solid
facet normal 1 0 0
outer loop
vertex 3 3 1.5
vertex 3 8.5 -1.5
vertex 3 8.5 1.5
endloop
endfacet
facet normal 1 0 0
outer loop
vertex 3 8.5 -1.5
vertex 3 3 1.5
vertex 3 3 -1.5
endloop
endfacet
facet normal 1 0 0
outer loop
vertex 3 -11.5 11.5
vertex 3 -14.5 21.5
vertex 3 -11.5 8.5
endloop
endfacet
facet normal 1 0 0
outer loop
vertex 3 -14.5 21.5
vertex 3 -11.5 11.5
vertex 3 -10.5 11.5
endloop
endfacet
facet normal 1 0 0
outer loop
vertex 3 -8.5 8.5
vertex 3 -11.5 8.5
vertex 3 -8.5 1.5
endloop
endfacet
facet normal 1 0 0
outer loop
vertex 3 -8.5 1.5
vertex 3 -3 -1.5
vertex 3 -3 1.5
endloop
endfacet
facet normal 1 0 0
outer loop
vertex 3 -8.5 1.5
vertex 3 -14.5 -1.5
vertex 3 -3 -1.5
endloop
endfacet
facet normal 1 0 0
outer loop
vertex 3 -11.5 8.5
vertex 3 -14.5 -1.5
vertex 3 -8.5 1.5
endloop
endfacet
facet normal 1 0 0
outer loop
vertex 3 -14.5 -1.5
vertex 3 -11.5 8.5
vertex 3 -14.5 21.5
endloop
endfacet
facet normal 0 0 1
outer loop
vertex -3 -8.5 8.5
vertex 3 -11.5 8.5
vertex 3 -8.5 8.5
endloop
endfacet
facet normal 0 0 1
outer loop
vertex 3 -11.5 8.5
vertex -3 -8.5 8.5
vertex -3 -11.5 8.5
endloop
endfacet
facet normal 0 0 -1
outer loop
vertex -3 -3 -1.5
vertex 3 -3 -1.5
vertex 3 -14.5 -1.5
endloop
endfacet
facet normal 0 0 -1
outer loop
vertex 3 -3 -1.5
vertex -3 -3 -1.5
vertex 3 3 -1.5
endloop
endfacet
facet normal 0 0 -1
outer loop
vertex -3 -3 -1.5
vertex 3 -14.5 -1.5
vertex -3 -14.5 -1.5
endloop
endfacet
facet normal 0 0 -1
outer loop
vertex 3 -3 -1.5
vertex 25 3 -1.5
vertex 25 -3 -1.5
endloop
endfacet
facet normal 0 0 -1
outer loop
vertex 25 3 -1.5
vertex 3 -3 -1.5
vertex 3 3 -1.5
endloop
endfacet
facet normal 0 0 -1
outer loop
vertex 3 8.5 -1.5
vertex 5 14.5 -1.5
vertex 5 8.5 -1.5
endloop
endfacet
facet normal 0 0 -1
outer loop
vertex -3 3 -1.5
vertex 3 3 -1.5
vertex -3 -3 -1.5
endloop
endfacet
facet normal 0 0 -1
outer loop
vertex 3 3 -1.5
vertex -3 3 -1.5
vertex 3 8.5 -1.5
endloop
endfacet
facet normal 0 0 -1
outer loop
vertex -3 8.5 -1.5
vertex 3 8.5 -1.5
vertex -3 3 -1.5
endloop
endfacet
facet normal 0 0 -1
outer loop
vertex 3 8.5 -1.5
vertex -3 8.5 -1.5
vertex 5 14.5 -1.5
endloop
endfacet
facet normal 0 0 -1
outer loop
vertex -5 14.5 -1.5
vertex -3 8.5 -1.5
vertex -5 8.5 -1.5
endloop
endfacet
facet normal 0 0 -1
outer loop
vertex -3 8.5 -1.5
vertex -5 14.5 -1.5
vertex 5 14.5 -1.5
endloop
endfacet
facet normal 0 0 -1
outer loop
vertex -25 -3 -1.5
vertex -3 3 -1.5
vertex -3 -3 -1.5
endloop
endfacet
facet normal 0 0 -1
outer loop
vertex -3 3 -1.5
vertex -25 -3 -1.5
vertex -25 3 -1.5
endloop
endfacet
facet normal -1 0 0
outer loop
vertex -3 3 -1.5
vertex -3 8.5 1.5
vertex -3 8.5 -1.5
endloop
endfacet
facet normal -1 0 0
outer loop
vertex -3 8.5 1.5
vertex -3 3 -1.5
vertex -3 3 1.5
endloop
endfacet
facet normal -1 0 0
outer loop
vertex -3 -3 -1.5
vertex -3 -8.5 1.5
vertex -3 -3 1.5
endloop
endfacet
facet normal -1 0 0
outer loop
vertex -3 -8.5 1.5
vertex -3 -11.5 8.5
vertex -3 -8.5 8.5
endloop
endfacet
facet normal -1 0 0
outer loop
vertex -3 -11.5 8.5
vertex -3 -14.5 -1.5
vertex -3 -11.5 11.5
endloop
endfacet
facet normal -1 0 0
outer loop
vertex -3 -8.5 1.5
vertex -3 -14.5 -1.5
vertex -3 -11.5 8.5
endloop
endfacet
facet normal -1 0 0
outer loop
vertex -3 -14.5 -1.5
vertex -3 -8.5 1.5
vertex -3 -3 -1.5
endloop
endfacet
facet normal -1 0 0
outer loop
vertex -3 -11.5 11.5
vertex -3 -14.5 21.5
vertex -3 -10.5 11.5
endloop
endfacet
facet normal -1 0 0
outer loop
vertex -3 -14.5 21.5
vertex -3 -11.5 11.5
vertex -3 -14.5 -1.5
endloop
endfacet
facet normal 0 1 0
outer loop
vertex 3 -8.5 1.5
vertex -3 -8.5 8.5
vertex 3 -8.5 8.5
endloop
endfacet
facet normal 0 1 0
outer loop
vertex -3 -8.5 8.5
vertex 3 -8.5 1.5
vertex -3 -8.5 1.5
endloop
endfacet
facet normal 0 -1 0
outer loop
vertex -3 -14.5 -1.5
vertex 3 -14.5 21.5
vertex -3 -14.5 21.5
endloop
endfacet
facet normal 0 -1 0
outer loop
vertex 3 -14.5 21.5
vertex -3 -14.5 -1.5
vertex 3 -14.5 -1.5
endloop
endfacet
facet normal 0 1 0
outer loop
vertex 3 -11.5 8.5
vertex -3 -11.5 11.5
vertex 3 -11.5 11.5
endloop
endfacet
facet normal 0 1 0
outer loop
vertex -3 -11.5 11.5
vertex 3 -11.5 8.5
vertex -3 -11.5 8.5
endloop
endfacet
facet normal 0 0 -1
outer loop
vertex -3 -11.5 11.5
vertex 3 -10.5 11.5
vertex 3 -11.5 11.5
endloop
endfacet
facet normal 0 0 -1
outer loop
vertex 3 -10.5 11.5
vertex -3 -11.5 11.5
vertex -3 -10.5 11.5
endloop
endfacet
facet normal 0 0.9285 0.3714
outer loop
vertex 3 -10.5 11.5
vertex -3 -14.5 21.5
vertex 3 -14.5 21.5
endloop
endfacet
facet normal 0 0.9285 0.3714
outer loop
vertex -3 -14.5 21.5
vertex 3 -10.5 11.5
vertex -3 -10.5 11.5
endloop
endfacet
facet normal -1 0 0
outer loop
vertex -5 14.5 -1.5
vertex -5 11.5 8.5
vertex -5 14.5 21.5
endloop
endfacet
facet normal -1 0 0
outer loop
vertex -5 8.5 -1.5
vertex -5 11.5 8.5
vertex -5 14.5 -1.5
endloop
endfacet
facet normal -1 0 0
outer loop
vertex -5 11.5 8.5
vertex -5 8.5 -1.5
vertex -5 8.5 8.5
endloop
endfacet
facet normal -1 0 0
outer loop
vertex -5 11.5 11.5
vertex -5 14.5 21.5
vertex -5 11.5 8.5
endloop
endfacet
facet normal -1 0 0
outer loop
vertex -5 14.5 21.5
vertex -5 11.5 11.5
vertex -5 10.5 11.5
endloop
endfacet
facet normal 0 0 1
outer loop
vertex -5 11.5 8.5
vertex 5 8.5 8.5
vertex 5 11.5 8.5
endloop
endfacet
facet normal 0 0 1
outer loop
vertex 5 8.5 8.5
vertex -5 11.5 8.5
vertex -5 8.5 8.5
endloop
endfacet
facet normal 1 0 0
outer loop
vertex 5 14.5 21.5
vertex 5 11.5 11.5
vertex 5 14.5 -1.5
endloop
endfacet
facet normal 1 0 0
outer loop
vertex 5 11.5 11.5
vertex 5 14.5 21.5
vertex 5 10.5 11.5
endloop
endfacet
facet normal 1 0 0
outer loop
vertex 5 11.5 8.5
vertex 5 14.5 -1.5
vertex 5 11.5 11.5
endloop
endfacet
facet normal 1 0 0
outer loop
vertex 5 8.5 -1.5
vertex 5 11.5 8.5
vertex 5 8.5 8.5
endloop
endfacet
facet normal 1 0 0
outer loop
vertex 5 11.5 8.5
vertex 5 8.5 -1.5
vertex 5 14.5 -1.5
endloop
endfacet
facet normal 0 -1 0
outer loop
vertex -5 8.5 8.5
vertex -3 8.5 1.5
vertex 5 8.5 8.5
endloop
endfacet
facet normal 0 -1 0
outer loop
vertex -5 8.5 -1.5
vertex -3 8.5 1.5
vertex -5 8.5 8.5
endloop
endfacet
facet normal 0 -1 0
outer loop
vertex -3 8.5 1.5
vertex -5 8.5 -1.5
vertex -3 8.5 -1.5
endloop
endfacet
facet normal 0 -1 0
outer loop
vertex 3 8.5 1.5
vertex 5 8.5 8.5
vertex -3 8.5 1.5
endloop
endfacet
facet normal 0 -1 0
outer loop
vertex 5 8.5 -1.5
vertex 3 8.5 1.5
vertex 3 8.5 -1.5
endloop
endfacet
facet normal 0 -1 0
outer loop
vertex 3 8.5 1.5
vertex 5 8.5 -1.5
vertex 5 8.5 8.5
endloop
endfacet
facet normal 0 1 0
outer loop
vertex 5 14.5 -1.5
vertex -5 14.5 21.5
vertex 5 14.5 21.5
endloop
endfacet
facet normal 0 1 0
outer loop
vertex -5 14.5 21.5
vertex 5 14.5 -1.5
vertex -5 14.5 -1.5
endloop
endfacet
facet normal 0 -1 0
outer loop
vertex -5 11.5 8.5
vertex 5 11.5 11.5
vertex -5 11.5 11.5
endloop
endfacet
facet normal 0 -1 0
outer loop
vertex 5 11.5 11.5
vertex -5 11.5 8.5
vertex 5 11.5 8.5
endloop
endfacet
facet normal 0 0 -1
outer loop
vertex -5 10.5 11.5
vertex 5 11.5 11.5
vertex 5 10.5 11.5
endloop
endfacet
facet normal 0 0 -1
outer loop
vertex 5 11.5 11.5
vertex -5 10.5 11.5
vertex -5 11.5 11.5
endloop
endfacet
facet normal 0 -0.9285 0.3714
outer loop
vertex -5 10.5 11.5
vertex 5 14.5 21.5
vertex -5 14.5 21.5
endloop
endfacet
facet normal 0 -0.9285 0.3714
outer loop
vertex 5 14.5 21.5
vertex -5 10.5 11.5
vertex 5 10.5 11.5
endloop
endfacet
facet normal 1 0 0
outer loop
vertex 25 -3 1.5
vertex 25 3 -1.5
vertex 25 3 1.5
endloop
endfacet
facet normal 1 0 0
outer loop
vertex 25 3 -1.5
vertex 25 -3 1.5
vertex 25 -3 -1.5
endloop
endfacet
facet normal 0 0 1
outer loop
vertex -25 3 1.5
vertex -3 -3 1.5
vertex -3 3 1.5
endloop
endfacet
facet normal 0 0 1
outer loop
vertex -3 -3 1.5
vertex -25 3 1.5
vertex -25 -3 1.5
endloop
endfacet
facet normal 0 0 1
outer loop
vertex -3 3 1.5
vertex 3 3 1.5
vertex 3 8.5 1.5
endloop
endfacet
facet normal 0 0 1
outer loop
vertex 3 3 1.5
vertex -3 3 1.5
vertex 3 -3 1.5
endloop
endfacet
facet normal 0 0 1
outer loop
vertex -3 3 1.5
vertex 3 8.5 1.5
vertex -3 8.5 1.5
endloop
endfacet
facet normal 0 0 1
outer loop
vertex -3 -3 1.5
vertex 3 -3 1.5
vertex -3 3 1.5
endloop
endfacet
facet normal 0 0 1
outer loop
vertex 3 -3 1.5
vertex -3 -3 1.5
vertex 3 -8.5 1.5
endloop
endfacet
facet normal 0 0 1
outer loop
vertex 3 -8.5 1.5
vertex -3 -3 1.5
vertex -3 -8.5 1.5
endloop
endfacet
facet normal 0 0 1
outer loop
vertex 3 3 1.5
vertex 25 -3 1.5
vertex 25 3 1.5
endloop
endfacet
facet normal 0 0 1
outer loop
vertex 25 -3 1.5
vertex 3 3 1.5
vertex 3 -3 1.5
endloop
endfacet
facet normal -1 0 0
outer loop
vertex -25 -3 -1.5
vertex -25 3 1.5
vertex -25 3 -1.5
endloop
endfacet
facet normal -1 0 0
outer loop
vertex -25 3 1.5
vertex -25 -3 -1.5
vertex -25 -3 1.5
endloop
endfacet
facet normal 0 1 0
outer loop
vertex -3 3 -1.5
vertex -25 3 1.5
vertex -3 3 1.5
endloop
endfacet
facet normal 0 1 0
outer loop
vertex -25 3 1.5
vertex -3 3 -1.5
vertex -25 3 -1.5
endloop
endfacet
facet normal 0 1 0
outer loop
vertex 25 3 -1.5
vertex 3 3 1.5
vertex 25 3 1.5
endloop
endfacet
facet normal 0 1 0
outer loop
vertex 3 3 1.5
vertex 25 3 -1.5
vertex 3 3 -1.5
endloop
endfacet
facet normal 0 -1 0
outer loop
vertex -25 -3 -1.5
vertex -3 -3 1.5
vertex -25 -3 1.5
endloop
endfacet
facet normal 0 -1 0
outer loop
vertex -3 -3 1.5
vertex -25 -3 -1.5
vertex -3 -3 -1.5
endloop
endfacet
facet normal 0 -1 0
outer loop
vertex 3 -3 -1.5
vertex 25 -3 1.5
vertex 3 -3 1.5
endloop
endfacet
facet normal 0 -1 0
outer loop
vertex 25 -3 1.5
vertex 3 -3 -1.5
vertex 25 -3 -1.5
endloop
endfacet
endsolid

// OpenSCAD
snap_holder_feather();
cube([50, 6, 3], center=true);
translate([0,0,0])
cube([6, 23, 3], center=true);

module snap_holder_feather(){
    translate([-3,-23/2-3,-1.5])
    snap_arm();
    translate([5,+23/2+3,-1.5])
    rotate([0,0,180])
    snap_arm(length=10);
    /*
    translate([107/2+3,-3,-1.5])
    rotate([0,0,90])
    snap_arm();
    
    translate([-107/2-3,3,-1.5])
    rotate([0,0,-90])
    snap_arm();
    */
}

module snap_arm(stand_height=10, lip_height=3, length=6){
    cube([length,6,stand_height]);
    cube([length,3,stand_height+lip_height+2]);
    translate([0,0,stand_height+lip_height])
    rotate([90,0,90])
    linear_extrude(length)
    polygon([[0,0], [0,10], [4,0]]);
}
